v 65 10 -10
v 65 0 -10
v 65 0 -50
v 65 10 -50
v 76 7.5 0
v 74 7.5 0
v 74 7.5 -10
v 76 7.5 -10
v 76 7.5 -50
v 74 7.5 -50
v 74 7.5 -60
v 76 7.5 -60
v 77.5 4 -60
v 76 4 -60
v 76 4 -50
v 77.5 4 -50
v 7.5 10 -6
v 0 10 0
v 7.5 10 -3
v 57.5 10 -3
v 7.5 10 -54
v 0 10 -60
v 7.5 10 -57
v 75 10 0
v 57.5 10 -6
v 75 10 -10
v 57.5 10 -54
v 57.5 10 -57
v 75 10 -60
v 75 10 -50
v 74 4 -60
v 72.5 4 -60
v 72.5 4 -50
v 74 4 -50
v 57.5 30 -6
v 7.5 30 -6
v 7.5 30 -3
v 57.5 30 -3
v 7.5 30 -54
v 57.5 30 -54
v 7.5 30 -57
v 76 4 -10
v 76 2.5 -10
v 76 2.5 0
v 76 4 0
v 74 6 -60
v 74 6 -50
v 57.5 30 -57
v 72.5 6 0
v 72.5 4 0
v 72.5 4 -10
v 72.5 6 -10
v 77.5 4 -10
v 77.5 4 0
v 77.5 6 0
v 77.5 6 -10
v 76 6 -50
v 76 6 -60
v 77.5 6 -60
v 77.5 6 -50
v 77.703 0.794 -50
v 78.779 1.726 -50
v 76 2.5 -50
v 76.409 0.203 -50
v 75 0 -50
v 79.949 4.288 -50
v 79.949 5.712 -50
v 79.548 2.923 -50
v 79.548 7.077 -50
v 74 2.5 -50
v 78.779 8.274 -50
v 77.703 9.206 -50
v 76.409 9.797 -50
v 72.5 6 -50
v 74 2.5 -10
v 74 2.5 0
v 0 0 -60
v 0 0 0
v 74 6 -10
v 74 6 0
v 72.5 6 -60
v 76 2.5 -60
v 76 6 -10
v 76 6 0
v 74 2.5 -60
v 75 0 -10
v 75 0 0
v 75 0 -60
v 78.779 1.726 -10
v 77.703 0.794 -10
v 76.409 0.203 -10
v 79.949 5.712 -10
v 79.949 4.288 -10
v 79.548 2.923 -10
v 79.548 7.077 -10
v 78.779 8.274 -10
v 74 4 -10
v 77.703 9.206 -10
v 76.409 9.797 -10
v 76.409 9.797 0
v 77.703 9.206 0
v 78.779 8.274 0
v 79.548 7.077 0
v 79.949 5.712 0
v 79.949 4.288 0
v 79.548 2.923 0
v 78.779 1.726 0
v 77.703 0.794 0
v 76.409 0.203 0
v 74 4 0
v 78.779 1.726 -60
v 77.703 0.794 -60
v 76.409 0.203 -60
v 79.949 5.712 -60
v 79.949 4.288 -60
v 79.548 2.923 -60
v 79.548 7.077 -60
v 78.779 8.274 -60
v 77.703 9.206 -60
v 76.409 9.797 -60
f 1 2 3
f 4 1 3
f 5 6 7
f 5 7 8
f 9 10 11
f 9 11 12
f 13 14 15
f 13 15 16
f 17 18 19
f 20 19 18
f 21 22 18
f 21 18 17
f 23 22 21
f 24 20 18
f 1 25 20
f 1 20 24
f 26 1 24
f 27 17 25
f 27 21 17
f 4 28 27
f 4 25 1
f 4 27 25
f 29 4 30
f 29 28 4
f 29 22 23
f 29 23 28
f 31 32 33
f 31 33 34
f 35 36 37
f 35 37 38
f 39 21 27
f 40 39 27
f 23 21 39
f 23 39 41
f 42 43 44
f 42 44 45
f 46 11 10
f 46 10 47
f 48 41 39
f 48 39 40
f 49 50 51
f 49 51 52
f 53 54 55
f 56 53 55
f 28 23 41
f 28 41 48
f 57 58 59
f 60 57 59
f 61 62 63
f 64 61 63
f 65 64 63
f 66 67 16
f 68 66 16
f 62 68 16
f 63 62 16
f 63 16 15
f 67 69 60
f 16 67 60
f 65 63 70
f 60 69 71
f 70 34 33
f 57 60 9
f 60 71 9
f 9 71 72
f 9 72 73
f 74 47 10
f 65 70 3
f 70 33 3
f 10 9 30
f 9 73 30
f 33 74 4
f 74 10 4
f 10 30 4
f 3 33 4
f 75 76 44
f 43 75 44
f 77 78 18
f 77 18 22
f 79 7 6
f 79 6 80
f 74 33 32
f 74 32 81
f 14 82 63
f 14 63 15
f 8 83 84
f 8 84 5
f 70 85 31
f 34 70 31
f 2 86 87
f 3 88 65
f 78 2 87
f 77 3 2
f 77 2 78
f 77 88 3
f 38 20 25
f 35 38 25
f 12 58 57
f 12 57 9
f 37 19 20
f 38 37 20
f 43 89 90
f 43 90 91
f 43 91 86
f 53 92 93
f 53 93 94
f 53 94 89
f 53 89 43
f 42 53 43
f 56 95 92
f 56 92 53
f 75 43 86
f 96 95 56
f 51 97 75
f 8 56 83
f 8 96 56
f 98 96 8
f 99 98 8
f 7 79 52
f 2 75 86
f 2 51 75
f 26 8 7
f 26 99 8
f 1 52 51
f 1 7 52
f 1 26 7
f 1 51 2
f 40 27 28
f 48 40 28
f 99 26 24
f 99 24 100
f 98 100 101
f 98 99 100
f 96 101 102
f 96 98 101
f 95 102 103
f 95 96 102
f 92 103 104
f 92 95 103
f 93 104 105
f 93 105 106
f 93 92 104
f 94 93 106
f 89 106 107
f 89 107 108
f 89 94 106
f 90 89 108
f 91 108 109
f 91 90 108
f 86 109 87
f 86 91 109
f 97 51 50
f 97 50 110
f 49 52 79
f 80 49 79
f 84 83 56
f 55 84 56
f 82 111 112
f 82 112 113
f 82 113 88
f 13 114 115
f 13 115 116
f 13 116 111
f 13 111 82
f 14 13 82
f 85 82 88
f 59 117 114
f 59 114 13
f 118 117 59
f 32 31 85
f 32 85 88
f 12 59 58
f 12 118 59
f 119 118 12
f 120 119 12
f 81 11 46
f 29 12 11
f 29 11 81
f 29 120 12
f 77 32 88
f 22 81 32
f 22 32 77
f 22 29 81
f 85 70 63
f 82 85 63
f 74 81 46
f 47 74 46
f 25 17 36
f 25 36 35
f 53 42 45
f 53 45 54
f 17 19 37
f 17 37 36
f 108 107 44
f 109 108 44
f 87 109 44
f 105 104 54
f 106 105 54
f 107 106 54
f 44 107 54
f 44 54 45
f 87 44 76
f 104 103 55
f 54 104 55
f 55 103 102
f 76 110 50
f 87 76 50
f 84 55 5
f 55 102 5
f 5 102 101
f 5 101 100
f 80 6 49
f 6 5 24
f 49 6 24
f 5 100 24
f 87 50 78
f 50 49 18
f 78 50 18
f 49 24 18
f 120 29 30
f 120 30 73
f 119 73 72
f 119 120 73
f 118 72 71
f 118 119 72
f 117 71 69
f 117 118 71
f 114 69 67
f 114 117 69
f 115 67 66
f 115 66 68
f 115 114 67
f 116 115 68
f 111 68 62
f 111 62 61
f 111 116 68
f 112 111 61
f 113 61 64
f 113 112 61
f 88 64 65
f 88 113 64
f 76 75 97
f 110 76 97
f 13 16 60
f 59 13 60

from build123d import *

# Parameters (mm, degrees)
SKETCH1_W               = 65
SKETCH1_H               = 60
BOSS_EXTRUDE1_DEPTH     = 10
BOSS_EXTRUDE2_DEPTH     = 10
BOSS_EXTRUDE3_START     = -10
BOSS_EXTRUDE3_DEPTH     = 10
CUT_EXTRUDE1_DEPTH      = 101.498756211
CUT_EXTRUDE1_DEPTH_BACK = 101.498756211
SKETCH7_W               = 1.5
SKETCH7_H               = 2
SKETCH7_W_2             = 2
SKETCH7_H_2             = 1.5
SKETCH8_W               = 50
SKETCH8_H               = 3
BOSS_EXTRUDE4_DEPTH     = 20


with BuildPart() as part:
    # Sketch1 → Boss-Extrude1 (new body)
    with BuildSketch(Plane(origin=(0, 0, 0), x_dir=(1, 0, 0), z_dir=(0, 1, 0))):
        with Locations((32.5, 30)):
            Rectangle(SKETCH1_W, SKETCH1_H)
    extrude(amount=BOSS_EXTRUDE1_DEPTH)

    # Sketch2 → Boss-Extrude2 (add)
    with BuildSketch(Plane(origin=(0, 0, -60), x_dir=(-1, 0, 0), z_dir=(0, 0, -1))):
        with BuildLine():
            Line((-65, 10), (-75, 10))
            ThreePointArc((-75, 10), (-80, 5), (-75, 0))
            Line((-75, 0), (-65, 0))
            Line((-65, 0), (-65, 10))
        make_face()
    extrude(amount=-BOSS_EXTRUDE2_DEPTH)

    # Sketch6 → Boss-Extrude3 (add)
    with BuildSketch(Plane.XY.offset(BOSS_EXTRUDE3_START)):
        with BuildLine():
            Line((65, 10), (75, 10))
            ThreePointArc((75, 10), (80, 5), (75, 0))
            Line((75, 0), (65, 0))
            Line((65, 0), (65, 10))
        make_face()
    extrude(amount=BOSS_EXTRUDE3_DEPTH)

    # Sketch7 → Cut-Extrude1 (cut, two sides: drawn at the far end of the back side and taken through both)
    with BuildSketch(Plane.XY.offset(-CUT_EXTRUDE1_DEPTH_BACK)):
        with Locations((76.75, 5)):
            Rectangle(SKETCH7_W, SKETCH7_H)
        with Locations((75, 6.75)):
            Rectangle(SKETCH7_W_2, SKETCH7_H_2)
        with Locations((75, 5)):
            Rectangle(SKETCH7_W_2, SKETCH7_H)
        with Locations((73.25, 5)):
            Rectangle(SKETCH7_W, SKETCH7_H)
        with Locations((75, 3.25)):
            Rectangle(SKETCH7_W_2, SKETCH7_H_2)
    extrude(amount=CUT_EXTRUDE1_DEPTH + CUT_EXTRUDE1_DEPTH_BACK, mode=Mode.SUBTRACT)

    # Sketch8 → Boss-Extrude4 (add)
    with BuildSketch(Plane(origin=(0, 10, 0), x_dir=(1, 0, 0), z_dir=(0, 1, 0))):
        with Locations((32.5, 4.5)):
            Rectangle(SKETCH8_W, SKETCH8_H)
        with Locations((32.5, 55.5)):
            Rectangle(SKETCH8_W, SKETCH8_H)
    extrude(amount=BOSS_EXTRUDE4_DEPTH)


solid = part.part
